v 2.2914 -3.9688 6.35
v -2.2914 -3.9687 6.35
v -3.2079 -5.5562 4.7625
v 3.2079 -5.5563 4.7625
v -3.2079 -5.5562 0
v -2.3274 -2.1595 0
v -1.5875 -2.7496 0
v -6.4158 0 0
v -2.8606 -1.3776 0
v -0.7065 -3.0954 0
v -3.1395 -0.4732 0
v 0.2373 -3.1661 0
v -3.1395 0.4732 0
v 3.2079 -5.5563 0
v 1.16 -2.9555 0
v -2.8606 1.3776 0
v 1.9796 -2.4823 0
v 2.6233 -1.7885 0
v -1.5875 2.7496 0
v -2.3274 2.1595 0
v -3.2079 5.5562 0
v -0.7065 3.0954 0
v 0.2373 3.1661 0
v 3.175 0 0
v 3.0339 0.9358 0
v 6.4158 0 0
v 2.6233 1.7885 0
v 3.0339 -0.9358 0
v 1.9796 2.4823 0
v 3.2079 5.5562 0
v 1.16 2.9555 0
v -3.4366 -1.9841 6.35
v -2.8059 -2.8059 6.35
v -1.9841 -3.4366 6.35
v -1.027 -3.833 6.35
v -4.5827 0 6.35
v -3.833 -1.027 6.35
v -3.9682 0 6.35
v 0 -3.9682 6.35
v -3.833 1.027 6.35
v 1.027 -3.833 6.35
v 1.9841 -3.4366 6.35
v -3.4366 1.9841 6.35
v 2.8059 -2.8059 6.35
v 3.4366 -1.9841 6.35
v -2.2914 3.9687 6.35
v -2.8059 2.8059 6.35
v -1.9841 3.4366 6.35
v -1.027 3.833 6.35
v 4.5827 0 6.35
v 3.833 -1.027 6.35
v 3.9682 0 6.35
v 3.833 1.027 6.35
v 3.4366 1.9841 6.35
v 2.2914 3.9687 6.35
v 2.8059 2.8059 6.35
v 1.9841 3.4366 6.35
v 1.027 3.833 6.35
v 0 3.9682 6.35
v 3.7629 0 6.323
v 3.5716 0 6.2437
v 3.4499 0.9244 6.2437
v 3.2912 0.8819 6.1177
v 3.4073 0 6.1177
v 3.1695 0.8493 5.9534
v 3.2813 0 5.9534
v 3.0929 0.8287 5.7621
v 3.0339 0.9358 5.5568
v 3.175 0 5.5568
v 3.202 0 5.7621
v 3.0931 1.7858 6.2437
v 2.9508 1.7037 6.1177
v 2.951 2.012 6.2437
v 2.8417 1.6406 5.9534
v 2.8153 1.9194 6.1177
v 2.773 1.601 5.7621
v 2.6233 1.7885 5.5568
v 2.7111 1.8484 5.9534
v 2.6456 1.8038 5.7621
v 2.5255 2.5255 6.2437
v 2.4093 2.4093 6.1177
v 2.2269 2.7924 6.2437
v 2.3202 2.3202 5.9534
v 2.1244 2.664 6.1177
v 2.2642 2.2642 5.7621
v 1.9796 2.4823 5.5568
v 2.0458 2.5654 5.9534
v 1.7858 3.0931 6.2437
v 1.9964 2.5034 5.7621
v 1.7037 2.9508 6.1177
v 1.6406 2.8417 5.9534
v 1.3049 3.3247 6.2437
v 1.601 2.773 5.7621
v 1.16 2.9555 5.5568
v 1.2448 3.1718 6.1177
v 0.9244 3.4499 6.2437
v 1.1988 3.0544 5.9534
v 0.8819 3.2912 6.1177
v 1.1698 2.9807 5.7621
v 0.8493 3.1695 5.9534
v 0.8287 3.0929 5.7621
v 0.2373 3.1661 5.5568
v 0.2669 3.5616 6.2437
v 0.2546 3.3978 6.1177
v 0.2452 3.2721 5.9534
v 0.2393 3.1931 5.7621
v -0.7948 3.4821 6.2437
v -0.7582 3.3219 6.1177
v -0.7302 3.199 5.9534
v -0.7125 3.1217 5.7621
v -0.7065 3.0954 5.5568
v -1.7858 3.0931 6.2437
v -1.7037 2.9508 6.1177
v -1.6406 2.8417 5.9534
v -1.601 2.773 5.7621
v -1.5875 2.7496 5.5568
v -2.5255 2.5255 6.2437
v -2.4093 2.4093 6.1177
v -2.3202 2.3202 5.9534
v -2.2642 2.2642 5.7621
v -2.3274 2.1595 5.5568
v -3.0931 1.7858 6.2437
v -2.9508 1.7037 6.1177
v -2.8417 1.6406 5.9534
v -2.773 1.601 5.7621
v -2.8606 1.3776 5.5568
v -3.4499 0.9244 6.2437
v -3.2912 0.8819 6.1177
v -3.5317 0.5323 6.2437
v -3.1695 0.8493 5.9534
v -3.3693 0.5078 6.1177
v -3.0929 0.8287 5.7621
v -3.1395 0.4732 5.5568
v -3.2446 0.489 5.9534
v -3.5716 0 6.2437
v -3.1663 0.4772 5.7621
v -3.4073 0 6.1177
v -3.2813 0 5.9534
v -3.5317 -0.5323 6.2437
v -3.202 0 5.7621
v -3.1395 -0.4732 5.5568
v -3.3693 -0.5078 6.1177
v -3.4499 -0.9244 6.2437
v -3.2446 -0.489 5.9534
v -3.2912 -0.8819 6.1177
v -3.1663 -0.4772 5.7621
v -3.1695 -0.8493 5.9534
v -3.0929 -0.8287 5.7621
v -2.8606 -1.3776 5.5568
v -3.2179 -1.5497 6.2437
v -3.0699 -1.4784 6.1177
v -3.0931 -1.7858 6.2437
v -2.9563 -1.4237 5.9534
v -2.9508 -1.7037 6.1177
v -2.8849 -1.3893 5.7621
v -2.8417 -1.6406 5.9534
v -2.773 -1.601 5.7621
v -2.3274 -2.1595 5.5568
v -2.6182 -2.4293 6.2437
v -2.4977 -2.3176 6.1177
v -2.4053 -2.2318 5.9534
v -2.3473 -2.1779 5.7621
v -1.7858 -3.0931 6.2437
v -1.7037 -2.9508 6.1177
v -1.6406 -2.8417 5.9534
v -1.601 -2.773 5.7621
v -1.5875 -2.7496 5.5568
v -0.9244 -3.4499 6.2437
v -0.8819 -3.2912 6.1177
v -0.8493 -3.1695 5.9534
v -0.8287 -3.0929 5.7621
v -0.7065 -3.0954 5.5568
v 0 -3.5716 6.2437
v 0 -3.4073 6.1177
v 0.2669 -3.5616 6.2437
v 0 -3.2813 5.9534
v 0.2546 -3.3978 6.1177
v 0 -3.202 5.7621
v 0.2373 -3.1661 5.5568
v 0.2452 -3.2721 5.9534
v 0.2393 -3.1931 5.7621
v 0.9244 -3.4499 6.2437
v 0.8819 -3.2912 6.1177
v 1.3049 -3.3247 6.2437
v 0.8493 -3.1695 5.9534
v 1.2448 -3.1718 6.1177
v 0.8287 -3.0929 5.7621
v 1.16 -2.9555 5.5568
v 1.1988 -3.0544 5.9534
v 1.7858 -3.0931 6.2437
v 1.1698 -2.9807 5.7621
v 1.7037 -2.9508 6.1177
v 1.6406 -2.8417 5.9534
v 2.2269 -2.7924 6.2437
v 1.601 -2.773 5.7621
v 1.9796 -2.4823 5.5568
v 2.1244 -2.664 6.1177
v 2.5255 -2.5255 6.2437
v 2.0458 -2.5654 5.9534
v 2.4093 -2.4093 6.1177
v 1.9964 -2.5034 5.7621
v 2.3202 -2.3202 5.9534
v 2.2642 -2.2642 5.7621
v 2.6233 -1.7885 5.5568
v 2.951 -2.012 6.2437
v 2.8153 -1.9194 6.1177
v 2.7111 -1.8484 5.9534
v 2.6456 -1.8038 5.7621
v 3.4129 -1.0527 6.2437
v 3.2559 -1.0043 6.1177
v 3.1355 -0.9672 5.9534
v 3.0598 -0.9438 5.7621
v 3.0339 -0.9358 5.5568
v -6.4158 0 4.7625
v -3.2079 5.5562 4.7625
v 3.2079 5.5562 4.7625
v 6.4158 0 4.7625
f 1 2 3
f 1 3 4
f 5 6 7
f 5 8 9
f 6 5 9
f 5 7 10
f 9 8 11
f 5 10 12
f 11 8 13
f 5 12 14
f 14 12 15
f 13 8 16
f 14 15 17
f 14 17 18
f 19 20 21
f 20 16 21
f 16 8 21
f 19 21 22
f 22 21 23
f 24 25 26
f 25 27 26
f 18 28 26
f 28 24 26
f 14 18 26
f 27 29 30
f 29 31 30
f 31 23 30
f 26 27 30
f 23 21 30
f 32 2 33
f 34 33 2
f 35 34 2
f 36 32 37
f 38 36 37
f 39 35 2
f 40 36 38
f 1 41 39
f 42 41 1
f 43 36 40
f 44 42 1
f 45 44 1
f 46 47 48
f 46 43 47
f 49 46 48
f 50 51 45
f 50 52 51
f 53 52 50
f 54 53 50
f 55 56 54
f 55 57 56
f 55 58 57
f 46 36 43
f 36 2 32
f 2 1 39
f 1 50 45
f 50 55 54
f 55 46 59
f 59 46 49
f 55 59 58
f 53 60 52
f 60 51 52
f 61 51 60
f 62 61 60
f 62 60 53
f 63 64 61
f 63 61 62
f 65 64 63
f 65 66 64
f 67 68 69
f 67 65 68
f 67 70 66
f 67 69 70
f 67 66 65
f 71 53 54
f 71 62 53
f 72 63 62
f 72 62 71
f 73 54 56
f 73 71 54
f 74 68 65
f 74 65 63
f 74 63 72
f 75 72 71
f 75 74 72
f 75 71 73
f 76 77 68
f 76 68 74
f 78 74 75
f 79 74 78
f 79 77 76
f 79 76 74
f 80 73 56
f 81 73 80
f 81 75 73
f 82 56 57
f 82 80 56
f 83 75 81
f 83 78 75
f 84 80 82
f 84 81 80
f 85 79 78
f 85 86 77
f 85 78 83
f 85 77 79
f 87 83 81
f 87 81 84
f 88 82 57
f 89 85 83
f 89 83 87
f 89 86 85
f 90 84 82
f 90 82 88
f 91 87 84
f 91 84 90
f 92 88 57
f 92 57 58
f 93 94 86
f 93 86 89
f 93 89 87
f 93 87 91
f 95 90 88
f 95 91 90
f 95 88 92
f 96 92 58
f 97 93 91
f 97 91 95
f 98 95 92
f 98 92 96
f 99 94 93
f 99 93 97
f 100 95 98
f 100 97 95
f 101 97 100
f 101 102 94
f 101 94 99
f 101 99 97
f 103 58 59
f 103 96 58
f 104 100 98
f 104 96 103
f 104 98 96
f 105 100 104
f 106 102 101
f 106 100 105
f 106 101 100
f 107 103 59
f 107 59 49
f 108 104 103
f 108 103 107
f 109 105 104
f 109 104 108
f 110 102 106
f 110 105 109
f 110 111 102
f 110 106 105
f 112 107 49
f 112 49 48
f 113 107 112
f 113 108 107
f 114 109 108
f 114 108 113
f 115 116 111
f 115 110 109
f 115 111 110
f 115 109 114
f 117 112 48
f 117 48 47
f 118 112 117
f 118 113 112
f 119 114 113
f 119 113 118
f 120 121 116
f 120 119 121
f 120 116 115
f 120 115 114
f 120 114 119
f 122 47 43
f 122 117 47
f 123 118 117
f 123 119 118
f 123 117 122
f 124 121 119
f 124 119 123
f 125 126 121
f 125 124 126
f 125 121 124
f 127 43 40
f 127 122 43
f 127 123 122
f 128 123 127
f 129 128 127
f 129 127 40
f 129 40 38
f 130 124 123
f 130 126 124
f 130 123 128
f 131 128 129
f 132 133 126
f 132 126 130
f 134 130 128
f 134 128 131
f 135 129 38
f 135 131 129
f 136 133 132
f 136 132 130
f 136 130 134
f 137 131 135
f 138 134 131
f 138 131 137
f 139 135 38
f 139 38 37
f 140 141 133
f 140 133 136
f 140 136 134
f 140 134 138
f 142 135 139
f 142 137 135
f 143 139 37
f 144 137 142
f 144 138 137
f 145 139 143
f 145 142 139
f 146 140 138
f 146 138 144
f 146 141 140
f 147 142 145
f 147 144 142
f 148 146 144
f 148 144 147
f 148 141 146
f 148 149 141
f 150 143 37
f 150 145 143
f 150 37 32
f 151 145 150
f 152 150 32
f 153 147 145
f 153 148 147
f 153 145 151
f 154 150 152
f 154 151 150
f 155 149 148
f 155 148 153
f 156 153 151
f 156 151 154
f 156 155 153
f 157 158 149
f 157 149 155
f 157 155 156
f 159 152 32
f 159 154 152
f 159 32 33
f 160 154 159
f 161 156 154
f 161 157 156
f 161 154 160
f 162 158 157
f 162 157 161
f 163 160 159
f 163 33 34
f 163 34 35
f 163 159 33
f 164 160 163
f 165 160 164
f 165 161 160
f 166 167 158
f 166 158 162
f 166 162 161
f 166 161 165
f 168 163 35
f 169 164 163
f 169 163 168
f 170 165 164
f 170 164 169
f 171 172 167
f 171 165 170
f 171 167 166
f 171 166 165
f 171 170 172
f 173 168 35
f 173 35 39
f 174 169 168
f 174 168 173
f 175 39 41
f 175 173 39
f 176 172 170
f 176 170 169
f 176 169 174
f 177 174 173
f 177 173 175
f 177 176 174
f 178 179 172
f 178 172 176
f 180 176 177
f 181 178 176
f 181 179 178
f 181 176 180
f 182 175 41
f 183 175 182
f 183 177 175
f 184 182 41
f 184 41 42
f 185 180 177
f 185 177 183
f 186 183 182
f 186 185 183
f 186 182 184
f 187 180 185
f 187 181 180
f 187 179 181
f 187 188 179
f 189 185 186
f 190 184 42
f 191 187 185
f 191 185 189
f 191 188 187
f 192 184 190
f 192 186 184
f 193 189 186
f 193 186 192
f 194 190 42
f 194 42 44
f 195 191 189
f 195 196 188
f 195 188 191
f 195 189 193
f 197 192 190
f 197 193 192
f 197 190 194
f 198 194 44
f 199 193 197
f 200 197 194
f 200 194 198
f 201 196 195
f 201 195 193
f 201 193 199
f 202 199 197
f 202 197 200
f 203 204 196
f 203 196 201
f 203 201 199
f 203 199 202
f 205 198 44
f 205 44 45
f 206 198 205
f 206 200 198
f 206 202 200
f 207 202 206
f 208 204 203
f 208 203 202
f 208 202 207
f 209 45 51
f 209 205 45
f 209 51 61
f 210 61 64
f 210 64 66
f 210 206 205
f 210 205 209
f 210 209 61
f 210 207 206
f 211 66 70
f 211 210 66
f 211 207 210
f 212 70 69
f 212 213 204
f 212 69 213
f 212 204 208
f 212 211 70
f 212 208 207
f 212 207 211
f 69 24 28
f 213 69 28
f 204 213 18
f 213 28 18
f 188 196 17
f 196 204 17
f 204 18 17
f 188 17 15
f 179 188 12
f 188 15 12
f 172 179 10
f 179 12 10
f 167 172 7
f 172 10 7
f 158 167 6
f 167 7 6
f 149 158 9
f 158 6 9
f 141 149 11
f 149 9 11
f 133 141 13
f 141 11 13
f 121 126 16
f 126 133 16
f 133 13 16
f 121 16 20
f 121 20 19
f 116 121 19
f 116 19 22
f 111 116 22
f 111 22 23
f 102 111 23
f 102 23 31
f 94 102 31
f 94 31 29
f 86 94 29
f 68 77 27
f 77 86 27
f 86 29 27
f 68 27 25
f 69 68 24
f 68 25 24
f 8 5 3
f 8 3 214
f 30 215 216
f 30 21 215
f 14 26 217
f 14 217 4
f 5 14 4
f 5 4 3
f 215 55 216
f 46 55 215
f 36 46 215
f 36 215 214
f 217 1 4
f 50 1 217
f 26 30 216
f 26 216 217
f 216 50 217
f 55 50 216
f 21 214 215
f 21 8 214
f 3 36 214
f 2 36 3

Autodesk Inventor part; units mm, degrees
ref_plane "YZ Plane" through (0, 0, 0) normal (1, 0, 0) x (0, 1, 0)
ref_plane "XZ Plane" through (0, 0, 0) normal (0, 1, 0) x (-1, 0, 0)
ref_plane "XY Plane" through (0, 0, 0) normal (0, 0, 1) x (1, 0, 0)
sketch "Sketch1" plane through (0, 0, 0) normal (0, 0, 1) x (1, 0, 0)
  circle A0 centre (0, 0) radius 3.175
  line L0 (3.2079, 5.5562) -> (6.4158, 0)
  line L1 (6.4158, 0) -> (3.2079, -5.5563)
  line L2 (3.2079, -5.5563) -> (-3.2079, -5.5562)
  line L3 (-3.2079, -5.5562) -> (-6.4158, 0)
  line L4 (-6.4158, 0) -> (-3.2079, 5.5562)
  line L5 (-3.2079, 5.5562) -> (3.2079, 5.5562)
  dimension "d0" = 6.35
  dimension "d1" = 11.1125
extrude "Extrusion1" add sketch "Sketch1" along normal blind 6.35
chamfer "Chamfer1" distance 1.5875 angle 45 6 edges at (4.8119, 2.7781, 6.35) (0, 5.5562, 6.35) (-4.8119, 2.7781, 6.35) (-4.8119, -2.7781, 6.35) (0, -5.5563, 6.35) (4.8119, -2.7781, 6.35)
thread "Thread1" size "1/4-20 UNC" class "2B" standard "ANSI Unified Screw Threads" full length
fillet "Fillet1" radius 0.7937 1 edges at (-3.175, 0, 6.35)
properties part number "nut_.25_20"
